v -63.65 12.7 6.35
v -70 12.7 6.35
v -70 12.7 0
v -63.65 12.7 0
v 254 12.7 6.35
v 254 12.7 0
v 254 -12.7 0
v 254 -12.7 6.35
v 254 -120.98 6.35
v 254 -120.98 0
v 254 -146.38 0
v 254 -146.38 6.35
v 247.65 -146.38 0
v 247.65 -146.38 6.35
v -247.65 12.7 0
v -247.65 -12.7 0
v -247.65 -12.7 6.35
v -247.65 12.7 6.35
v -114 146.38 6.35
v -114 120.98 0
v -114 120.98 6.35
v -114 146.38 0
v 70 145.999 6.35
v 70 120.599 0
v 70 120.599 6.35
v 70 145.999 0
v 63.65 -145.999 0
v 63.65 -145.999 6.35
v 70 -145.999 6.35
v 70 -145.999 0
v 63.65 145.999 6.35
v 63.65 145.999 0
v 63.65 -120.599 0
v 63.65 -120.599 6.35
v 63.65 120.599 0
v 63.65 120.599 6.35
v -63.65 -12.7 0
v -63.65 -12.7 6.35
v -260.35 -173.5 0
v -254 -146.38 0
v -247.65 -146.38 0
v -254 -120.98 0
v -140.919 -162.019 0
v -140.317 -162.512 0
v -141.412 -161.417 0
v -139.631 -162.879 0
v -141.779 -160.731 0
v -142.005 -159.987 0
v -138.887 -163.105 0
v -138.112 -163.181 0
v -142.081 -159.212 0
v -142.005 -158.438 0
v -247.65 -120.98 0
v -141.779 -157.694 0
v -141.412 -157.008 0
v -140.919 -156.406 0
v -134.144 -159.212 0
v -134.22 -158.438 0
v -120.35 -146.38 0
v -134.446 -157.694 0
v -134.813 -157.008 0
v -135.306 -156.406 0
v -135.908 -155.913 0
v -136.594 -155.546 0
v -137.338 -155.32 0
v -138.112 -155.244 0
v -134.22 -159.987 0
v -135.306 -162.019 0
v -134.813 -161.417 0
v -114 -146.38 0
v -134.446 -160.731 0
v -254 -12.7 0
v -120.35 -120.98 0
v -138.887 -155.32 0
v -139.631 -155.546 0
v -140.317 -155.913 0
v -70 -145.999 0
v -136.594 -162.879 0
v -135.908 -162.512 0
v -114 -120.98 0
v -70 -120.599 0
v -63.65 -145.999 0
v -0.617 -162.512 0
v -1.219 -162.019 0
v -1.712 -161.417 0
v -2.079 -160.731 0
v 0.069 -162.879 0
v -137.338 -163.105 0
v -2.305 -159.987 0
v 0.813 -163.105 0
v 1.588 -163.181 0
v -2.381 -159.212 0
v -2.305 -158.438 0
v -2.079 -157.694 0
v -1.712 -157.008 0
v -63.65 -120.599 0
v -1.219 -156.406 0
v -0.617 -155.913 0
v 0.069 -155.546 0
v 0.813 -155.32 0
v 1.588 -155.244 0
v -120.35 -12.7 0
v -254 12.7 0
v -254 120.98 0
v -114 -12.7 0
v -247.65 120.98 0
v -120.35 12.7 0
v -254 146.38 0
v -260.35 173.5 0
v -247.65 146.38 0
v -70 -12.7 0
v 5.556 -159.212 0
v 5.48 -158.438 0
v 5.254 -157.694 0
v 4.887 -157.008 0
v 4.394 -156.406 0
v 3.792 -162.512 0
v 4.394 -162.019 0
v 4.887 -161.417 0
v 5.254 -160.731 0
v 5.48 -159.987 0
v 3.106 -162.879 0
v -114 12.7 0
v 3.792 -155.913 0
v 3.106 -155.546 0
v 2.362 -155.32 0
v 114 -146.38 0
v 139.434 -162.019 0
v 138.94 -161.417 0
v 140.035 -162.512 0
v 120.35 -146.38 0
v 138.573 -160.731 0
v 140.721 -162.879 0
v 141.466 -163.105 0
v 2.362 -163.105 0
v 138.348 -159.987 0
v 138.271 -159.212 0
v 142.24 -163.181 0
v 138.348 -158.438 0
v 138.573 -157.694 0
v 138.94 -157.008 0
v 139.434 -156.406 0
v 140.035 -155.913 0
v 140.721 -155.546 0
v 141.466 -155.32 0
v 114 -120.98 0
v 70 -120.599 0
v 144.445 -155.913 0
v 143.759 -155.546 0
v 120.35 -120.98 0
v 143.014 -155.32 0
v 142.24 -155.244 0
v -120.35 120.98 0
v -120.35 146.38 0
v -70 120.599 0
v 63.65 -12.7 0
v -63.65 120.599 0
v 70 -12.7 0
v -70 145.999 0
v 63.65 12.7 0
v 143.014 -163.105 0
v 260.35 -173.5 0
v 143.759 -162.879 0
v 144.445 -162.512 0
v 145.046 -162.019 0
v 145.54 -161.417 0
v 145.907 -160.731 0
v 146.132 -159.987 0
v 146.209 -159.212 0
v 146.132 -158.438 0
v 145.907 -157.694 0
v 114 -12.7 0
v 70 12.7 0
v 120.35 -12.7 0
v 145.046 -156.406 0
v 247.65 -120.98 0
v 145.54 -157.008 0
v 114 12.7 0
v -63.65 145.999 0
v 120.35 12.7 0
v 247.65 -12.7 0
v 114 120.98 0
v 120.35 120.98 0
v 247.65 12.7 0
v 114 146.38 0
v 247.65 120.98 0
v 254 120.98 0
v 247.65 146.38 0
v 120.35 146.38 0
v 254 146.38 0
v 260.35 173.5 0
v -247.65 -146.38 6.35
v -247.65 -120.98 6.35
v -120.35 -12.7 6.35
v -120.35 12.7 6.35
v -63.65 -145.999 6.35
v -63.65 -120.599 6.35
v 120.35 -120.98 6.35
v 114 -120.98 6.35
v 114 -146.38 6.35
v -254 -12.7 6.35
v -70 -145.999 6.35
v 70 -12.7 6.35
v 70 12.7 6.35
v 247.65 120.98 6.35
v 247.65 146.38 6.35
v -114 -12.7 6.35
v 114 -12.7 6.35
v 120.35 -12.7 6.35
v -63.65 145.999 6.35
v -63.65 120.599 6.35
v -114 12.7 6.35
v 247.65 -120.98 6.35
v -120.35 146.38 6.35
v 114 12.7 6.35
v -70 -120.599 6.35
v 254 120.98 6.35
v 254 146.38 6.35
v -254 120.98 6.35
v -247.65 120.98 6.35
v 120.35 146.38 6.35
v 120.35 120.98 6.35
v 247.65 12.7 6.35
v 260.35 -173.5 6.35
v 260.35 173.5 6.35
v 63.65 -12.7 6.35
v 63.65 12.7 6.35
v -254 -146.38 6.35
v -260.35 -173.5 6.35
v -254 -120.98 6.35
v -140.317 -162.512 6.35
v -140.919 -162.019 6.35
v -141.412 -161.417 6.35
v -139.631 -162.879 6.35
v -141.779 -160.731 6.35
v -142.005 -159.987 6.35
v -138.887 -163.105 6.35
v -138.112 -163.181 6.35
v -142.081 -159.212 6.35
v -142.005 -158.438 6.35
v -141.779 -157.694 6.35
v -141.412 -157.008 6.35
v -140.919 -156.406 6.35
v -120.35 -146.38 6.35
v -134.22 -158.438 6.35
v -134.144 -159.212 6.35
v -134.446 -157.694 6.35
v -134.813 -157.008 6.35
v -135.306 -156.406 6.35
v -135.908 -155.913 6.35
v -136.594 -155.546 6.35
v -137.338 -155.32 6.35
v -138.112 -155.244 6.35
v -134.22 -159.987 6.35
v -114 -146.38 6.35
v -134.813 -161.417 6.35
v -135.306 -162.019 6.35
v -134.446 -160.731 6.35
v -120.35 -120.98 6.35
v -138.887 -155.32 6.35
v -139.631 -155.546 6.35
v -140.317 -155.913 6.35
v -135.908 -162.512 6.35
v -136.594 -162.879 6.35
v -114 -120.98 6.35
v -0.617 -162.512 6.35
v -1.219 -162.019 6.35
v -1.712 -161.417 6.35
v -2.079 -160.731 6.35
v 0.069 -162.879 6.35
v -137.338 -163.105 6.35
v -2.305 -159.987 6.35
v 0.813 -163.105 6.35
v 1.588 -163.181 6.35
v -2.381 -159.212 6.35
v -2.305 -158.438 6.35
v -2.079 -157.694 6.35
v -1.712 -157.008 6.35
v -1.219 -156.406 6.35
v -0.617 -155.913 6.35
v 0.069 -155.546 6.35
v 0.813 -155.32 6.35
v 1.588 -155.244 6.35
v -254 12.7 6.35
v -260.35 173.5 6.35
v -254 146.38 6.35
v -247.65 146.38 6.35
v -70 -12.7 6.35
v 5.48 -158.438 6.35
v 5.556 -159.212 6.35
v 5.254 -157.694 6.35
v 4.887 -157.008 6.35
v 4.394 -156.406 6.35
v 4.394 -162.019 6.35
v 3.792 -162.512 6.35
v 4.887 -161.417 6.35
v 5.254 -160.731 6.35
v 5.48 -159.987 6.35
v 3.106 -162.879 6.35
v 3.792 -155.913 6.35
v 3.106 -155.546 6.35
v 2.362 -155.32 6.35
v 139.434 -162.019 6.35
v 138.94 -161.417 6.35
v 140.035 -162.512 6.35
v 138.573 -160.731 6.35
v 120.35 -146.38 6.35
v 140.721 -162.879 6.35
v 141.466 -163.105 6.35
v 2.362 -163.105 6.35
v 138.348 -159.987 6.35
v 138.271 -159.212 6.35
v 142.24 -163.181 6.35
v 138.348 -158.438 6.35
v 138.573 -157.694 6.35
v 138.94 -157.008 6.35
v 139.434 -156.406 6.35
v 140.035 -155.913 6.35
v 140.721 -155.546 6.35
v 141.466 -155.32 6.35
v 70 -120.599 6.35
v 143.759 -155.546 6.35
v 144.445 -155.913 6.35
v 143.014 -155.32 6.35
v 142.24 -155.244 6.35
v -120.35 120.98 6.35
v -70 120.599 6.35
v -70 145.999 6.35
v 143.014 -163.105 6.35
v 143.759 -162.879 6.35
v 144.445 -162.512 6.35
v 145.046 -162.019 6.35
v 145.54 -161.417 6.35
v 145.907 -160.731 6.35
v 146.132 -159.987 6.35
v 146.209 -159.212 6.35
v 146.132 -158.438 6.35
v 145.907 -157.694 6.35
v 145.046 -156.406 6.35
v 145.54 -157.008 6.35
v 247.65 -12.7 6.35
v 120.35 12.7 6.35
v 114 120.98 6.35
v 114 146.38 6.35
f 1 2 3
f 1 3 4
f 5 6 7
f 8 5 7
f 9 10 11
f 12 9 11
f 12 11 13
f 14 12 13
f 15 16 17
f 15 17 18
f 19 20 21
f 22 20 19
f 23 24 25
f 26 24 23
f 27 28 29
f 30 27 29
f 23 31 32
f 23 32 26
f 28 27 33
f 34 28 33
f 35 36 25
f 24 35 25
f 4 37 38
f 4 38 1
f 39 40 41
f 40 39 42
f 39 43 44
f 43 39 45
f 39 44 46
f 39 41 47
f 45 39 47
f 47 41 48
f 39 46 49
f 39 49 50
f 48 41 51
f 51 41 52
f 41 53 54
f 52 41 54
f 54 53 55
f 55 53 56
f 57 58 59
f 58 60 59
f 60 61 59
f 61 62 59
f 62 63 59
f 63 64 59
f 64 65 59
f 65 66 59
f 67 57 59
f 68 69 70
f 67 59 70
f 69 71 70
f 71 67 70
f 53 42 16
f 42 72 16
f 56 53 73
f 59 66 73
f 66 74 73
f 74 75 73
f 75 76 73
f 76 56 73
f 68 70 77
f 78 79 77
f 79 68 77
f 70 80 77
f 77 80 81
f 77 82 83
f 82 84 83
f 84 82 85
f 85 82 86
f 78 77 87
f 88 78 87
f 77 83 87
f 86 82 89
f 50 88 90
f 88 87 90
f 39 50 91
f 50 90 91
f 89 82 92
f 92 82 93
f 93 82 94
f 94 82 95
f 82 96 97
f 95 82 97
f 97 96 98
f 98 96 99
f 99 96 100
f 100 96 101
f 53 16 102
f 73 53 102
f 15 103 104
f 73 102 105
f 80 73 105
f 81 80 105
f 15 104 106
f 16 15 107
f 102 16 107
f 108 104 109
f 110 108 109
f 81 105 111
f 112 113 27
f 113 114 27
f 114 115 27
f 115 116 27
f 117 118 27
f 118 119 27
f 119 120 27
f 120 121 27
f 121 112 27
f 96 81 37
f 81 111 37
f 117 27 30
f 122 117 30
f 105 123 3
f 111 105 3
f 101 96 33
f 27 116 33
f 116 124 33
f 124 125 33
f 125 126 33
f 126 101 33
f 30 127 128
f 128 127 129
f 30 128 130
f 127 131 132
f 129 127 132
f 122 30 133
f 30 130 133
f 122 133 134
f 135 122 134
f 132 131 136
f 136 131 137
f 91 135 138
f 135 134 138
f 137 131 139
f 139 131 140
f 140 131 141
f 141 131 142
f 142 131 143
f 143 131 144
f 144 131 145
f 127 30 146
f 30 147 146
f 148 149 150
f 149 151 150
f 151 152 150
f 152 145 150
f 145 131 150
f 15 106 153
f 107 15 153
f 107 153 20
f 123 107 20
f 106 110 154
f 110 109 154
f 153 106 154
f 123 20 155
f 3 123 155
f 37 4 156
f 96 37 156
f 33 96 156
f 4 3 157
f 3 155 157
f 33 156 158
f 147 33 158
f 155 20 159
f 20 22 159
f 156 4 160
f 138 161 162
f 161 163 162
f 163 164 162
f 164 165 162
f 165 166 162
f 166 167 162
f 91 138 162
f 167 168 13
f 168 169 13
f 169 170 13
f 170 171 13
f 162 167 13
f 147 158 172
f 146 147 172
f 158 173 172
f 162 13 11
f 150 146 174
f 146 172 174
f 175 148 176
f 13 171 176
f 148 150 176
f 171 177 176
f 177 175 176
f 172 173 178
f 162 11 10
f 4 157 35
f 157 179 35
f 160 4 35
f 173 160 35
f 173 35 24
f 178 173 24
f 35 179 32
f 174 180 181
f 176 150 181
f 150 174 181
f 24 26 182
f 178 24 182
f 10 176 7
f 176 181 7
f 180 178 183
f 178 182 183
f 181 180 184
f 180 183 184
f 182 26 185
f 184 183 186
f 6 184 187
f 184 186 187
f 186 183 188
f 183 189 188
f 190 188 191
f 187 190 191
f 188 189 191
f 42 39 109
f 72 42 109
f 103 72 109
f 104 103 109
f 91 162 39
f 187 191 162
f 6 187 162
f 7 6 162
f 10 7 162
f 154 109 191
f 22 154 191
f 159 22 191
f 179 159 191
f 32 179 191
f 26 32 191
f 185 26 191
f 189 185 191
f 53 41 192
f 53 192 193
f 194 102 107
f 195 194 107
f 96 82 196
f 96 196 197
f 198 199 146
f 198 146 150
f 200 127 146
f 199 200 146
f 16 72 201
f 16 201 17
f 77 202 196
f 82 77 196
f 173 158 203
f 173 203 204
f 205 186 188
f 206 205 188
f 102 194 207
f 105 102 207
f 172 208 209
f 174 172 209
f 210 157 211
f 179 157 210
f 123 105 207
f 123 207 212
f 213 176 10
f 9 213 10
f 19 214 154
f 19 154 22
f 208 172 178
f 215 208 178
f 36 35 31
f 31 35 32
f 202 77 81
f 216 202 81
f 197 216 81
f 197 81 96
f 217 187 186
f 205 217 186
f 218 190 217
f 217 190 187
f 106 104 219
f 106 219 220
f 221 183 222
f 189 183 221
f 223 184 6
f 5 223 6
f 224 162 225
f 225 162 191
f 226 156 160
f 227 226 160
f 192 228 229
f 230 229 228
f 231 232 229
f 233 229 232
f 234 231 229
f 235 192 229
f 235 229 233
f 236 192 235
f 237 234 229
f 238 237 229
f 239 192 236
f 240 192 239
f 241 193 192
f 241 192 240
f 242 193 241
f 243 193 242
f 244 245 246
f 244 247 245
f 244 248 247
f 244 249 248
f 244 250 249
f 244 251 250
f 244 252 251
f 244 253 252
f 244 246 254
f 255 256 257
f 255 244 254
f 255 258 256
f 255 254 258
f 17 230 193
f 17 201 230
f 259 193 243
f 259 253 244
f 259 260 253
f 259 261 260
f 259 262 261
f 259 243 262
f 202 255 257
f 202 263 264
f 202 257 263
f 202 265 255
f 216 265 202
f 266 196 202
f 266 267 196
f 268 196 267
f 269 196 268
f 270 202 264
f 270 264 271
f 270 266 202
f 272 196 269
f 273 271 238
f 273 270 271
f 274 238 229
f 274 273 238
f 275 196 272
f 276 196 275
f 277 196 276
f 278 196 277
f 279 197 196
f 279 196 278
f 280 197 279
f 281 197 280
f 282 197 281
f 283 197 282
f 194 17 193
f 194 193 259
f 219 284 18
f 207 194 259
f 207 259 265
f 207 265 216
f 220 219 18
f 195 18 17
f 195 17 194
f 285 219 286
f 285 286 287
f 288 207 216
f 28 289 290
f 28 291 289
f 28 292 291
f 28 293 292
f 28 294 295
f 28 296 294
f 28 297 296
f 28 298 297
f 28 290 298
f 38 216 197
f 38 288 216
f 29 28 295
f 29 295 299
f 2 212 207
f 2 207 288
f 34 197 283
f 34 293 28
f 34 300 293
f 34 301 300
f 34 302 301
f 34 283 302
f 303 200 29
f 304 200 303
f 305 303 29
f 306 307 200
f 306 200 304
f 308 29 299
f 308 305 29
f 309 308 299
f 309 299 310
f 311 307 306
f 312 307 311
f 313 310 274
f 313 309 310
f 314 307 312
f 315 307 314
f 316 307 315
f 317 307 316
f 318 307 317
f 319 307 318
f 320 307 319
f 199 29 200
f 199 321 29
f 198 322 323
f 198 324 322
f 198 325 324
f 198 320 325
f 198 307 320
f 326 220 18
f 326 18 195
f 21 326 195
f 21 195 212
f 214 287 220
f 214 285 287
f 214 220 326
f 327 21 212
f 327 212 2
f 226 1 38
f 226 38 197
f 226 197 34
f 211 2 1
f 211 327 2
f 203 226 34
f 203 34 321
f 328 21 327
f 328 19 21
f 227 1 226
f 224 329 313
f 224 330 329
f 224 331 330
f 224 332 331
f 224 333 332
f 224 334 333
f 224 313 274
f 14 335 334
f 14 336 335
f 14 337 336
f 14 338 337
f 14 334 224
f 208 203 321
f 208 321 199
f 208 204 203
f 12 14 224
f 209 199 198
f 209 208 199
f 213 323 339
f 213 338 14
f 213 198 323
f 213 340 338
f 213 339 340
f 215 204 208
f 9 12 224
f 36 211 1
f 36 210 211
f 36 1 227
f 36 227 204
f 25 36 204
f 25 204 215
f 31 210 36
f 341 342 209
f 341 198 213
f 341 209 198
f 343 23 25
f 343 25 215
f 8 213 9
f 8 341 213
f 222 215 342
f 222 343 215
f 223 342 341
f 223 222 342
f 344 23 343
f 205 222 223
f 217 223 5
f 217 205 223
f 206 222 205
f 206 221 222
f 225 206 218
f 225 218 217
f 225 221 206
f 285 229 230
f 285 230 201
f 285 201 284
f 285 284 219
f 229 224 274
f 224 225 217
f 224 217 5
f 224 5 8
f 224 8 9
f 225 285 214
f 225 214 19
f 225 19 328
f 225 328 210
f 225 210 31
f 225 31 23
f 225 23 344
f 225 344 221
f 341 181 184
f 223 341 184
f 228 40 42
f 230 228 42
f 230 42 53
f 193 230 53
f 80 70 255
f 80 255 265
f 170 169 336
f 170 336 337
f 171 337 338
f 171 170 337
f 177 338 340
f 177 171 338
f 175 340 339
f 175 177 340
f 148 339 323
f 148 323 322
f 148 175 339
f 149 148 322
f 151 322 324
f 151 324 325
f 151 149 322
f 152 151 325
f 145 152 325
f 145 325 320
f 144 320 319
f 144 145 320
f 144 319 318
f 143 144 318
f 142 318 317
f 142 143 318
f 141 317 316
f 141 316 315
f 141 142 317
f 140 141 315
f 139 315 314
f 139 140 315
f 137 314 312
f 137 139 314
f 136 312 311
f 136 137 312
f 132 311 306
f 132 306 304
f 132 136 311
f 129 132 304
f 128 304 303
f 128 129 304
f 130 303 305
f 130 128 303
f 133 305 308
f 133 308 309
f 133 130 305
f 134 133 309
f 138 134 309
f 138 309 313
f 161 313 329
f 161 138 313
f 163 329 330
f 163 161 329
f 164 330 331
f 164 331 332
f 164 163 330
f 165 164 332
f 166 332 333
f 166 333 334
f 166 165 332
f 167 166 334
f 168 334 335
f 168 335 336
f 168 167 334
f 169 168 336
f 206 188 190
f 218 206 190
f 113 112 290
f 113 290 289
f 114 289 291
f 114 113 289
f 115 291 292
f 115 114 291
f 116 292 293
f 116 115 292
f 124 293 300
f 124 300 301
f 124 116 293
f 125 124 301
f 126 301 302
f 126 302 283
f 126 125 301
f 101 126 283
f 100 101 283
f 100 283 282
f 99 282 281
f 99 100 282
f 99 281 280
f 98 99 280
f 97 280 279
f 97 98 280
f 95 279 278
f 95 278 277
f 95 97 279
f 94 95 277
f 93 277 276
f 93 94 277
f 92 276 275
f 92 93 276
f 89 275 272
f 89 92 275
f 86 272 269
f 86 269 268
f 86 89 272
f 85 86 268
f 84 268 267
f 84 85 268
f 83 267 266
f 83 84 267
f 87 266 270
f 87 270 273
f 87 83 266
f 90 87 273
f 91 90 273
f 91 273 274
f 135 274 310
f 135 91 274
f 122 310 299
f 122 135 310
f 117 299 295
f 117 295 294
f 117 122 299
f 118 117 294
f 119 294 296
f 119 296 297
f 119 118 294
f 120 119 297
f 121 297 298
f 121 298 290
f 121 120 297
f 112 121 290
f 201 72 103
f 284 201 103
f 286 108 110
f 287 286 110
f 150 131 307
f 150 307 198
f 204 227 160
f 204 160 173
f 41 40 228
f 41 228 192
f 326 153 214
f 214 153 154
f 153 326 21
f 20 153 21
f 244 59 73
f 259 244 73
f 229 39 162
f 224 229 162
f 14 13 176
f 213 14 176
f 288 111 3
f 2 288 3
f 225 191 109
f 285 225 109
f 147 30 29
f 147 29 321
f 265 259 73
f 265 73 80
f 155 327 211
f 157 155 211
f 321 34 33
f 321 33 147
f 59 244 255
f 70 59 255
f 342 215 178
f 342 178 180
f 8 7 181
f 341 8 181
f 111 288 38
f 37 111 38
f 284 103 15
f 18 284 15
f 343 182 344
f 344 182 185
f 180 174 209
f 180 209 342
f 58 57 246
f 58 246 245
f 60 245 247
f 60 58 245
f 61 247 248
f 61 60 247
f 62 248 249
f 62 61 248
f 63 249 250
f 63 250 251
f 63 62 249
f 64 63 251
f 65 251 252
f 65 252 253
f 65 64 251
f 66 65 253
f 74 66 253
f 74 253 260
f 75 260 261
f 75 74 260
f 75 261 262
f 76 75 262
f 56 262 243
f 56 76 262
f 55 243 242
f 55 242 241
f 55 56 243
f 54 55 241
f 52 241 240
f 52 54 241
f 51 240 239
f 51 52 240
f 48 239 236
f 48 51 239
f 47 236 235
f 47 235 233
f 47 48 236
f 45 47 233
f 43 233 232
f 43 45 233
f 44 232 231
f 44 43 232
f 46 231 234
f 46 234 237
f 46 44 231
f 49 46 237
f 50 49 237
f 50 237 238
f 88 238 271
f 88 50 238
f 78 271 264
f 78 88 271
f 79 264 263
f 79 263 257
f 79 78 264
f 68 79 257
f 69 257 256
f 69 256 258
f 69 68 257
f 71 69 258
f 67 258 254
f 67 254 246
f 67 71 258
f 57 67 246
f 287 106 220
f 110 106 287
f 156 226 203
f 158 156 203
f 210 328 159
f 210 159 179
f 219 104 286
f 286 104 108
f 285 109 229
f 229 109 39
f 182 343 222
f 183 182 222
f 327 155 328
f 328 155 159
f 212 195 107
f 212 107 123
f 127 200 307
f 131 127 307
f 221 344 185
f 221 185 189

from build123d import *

# Parameters (mm, degrees)
F0_W     = 6.35
F0_H     = 25.4
F0_R     = 3.96875
F1_DEPTH = 6.35


with BuildPart() as f1:
    # F0 (on Top) → F1 (new body)
    with BuildSketch(Plane.XY):
        Polygon((254, 146.3802), (254, 173.5), (-254, 173.5), (-260.35, 173.5), (-260.35, -173.5), (-254, -173.5), (254, -173.5), (254, -146.3802), (247.65, -146.3802), (247.65, -120.9802), (254, -120.9802), (254, -12.7), (247.65, -12.7), (247.65, 12.7), (254, 12.7), (254, 120.9802), (247.65, 120.9802), (247.65, 146.3802), align=None)
        with Locations((-250.825, -133.6802)):
            Rectangle(F0_W, F0_H, mode=Mode.SUBTRACT)
        with Locations((-138.1125, -159.2125)):
            Circle(F0_R, mode=Mode.SUBTRACT)
        with Locations((-117.175, -133.6802)):
            Rectangle(F0_W, F0_H, mode=Mode.SUBTRACT)
        with Locations((-66.825, -133.2992)):
            Rectangle(F0_W, F0_H, mode=Mode.SUBTRACT)
        with Locations((-250.825, 0)):
            Rectangle(F0_W, F0_H, mode=Mode.SUBTRACT)
        with Locations((-117.175, 0)):
            Rectangle(F0_W, F0_H, mode=Mode.SUBTRACT)
        with Locations((-66.825, 0)):
            Rectangle(F0_W, F0_H, mode=Mode.SUBTRACT)
        with Locations((1.5875, -159.2125)):
            Circle(F0_R, mode=Mode.SUBTRACT)
        with Locations((66.825, -133.2992)):
            Rectangle(F0_W, F0_H, mode=Mode.SUBTRACT)
        with Locations((117.175, -133.6802)):
            Rectangle(F0_W, F0_H, mode=Mode.SUBTRACT)
        with Locations((142.24, -159.2125)):
            Circle(F0_R, mode=Mode.SUBTRACT)
        with Locations((66.825, 0)):
            Rectangle(F0_W, F0_H, mode=Mode.SUBTRACT)
        with Locations((117.175, 0)):
            Rectangle(F0_W, F0_H, mode=Mode.SUBTRACT)
        with Locations((-250.825, 133.6802)):
            Rectangle(F0_W, F0_H, mode=Mode.SUBTRACT)
        with Locations((-117.175, 133.6802)):
            Rectangle(F0_W, F0_H, mode=Mode.SUBTRACT)
        with Locations((-66.825, 133.2992)):
            Rectangle(F0_W, F0_H, mode=Mode.SUBTRACT)
        with Locations((66.825, 133.2992)):
            Rectangle(F0_W, F0_H, mode=Mode.SUBTRACT)
        with Locations((117.175, 133.6802)):
            Rectangle(F0_W, F0_H, mode=Mode.SUBTRACT)
        Polygon((260.35, 173.5), (254, 173.5), (254, 146.3802), (254, 120.9802), (254, 12.7), (254, -12.7), (254, -120.9802), (254, -146.3802), (254, -173.5), (260.35, -173.5), align=None)
    extrude(amount=F1_DEPTH)


solid = f1.part
